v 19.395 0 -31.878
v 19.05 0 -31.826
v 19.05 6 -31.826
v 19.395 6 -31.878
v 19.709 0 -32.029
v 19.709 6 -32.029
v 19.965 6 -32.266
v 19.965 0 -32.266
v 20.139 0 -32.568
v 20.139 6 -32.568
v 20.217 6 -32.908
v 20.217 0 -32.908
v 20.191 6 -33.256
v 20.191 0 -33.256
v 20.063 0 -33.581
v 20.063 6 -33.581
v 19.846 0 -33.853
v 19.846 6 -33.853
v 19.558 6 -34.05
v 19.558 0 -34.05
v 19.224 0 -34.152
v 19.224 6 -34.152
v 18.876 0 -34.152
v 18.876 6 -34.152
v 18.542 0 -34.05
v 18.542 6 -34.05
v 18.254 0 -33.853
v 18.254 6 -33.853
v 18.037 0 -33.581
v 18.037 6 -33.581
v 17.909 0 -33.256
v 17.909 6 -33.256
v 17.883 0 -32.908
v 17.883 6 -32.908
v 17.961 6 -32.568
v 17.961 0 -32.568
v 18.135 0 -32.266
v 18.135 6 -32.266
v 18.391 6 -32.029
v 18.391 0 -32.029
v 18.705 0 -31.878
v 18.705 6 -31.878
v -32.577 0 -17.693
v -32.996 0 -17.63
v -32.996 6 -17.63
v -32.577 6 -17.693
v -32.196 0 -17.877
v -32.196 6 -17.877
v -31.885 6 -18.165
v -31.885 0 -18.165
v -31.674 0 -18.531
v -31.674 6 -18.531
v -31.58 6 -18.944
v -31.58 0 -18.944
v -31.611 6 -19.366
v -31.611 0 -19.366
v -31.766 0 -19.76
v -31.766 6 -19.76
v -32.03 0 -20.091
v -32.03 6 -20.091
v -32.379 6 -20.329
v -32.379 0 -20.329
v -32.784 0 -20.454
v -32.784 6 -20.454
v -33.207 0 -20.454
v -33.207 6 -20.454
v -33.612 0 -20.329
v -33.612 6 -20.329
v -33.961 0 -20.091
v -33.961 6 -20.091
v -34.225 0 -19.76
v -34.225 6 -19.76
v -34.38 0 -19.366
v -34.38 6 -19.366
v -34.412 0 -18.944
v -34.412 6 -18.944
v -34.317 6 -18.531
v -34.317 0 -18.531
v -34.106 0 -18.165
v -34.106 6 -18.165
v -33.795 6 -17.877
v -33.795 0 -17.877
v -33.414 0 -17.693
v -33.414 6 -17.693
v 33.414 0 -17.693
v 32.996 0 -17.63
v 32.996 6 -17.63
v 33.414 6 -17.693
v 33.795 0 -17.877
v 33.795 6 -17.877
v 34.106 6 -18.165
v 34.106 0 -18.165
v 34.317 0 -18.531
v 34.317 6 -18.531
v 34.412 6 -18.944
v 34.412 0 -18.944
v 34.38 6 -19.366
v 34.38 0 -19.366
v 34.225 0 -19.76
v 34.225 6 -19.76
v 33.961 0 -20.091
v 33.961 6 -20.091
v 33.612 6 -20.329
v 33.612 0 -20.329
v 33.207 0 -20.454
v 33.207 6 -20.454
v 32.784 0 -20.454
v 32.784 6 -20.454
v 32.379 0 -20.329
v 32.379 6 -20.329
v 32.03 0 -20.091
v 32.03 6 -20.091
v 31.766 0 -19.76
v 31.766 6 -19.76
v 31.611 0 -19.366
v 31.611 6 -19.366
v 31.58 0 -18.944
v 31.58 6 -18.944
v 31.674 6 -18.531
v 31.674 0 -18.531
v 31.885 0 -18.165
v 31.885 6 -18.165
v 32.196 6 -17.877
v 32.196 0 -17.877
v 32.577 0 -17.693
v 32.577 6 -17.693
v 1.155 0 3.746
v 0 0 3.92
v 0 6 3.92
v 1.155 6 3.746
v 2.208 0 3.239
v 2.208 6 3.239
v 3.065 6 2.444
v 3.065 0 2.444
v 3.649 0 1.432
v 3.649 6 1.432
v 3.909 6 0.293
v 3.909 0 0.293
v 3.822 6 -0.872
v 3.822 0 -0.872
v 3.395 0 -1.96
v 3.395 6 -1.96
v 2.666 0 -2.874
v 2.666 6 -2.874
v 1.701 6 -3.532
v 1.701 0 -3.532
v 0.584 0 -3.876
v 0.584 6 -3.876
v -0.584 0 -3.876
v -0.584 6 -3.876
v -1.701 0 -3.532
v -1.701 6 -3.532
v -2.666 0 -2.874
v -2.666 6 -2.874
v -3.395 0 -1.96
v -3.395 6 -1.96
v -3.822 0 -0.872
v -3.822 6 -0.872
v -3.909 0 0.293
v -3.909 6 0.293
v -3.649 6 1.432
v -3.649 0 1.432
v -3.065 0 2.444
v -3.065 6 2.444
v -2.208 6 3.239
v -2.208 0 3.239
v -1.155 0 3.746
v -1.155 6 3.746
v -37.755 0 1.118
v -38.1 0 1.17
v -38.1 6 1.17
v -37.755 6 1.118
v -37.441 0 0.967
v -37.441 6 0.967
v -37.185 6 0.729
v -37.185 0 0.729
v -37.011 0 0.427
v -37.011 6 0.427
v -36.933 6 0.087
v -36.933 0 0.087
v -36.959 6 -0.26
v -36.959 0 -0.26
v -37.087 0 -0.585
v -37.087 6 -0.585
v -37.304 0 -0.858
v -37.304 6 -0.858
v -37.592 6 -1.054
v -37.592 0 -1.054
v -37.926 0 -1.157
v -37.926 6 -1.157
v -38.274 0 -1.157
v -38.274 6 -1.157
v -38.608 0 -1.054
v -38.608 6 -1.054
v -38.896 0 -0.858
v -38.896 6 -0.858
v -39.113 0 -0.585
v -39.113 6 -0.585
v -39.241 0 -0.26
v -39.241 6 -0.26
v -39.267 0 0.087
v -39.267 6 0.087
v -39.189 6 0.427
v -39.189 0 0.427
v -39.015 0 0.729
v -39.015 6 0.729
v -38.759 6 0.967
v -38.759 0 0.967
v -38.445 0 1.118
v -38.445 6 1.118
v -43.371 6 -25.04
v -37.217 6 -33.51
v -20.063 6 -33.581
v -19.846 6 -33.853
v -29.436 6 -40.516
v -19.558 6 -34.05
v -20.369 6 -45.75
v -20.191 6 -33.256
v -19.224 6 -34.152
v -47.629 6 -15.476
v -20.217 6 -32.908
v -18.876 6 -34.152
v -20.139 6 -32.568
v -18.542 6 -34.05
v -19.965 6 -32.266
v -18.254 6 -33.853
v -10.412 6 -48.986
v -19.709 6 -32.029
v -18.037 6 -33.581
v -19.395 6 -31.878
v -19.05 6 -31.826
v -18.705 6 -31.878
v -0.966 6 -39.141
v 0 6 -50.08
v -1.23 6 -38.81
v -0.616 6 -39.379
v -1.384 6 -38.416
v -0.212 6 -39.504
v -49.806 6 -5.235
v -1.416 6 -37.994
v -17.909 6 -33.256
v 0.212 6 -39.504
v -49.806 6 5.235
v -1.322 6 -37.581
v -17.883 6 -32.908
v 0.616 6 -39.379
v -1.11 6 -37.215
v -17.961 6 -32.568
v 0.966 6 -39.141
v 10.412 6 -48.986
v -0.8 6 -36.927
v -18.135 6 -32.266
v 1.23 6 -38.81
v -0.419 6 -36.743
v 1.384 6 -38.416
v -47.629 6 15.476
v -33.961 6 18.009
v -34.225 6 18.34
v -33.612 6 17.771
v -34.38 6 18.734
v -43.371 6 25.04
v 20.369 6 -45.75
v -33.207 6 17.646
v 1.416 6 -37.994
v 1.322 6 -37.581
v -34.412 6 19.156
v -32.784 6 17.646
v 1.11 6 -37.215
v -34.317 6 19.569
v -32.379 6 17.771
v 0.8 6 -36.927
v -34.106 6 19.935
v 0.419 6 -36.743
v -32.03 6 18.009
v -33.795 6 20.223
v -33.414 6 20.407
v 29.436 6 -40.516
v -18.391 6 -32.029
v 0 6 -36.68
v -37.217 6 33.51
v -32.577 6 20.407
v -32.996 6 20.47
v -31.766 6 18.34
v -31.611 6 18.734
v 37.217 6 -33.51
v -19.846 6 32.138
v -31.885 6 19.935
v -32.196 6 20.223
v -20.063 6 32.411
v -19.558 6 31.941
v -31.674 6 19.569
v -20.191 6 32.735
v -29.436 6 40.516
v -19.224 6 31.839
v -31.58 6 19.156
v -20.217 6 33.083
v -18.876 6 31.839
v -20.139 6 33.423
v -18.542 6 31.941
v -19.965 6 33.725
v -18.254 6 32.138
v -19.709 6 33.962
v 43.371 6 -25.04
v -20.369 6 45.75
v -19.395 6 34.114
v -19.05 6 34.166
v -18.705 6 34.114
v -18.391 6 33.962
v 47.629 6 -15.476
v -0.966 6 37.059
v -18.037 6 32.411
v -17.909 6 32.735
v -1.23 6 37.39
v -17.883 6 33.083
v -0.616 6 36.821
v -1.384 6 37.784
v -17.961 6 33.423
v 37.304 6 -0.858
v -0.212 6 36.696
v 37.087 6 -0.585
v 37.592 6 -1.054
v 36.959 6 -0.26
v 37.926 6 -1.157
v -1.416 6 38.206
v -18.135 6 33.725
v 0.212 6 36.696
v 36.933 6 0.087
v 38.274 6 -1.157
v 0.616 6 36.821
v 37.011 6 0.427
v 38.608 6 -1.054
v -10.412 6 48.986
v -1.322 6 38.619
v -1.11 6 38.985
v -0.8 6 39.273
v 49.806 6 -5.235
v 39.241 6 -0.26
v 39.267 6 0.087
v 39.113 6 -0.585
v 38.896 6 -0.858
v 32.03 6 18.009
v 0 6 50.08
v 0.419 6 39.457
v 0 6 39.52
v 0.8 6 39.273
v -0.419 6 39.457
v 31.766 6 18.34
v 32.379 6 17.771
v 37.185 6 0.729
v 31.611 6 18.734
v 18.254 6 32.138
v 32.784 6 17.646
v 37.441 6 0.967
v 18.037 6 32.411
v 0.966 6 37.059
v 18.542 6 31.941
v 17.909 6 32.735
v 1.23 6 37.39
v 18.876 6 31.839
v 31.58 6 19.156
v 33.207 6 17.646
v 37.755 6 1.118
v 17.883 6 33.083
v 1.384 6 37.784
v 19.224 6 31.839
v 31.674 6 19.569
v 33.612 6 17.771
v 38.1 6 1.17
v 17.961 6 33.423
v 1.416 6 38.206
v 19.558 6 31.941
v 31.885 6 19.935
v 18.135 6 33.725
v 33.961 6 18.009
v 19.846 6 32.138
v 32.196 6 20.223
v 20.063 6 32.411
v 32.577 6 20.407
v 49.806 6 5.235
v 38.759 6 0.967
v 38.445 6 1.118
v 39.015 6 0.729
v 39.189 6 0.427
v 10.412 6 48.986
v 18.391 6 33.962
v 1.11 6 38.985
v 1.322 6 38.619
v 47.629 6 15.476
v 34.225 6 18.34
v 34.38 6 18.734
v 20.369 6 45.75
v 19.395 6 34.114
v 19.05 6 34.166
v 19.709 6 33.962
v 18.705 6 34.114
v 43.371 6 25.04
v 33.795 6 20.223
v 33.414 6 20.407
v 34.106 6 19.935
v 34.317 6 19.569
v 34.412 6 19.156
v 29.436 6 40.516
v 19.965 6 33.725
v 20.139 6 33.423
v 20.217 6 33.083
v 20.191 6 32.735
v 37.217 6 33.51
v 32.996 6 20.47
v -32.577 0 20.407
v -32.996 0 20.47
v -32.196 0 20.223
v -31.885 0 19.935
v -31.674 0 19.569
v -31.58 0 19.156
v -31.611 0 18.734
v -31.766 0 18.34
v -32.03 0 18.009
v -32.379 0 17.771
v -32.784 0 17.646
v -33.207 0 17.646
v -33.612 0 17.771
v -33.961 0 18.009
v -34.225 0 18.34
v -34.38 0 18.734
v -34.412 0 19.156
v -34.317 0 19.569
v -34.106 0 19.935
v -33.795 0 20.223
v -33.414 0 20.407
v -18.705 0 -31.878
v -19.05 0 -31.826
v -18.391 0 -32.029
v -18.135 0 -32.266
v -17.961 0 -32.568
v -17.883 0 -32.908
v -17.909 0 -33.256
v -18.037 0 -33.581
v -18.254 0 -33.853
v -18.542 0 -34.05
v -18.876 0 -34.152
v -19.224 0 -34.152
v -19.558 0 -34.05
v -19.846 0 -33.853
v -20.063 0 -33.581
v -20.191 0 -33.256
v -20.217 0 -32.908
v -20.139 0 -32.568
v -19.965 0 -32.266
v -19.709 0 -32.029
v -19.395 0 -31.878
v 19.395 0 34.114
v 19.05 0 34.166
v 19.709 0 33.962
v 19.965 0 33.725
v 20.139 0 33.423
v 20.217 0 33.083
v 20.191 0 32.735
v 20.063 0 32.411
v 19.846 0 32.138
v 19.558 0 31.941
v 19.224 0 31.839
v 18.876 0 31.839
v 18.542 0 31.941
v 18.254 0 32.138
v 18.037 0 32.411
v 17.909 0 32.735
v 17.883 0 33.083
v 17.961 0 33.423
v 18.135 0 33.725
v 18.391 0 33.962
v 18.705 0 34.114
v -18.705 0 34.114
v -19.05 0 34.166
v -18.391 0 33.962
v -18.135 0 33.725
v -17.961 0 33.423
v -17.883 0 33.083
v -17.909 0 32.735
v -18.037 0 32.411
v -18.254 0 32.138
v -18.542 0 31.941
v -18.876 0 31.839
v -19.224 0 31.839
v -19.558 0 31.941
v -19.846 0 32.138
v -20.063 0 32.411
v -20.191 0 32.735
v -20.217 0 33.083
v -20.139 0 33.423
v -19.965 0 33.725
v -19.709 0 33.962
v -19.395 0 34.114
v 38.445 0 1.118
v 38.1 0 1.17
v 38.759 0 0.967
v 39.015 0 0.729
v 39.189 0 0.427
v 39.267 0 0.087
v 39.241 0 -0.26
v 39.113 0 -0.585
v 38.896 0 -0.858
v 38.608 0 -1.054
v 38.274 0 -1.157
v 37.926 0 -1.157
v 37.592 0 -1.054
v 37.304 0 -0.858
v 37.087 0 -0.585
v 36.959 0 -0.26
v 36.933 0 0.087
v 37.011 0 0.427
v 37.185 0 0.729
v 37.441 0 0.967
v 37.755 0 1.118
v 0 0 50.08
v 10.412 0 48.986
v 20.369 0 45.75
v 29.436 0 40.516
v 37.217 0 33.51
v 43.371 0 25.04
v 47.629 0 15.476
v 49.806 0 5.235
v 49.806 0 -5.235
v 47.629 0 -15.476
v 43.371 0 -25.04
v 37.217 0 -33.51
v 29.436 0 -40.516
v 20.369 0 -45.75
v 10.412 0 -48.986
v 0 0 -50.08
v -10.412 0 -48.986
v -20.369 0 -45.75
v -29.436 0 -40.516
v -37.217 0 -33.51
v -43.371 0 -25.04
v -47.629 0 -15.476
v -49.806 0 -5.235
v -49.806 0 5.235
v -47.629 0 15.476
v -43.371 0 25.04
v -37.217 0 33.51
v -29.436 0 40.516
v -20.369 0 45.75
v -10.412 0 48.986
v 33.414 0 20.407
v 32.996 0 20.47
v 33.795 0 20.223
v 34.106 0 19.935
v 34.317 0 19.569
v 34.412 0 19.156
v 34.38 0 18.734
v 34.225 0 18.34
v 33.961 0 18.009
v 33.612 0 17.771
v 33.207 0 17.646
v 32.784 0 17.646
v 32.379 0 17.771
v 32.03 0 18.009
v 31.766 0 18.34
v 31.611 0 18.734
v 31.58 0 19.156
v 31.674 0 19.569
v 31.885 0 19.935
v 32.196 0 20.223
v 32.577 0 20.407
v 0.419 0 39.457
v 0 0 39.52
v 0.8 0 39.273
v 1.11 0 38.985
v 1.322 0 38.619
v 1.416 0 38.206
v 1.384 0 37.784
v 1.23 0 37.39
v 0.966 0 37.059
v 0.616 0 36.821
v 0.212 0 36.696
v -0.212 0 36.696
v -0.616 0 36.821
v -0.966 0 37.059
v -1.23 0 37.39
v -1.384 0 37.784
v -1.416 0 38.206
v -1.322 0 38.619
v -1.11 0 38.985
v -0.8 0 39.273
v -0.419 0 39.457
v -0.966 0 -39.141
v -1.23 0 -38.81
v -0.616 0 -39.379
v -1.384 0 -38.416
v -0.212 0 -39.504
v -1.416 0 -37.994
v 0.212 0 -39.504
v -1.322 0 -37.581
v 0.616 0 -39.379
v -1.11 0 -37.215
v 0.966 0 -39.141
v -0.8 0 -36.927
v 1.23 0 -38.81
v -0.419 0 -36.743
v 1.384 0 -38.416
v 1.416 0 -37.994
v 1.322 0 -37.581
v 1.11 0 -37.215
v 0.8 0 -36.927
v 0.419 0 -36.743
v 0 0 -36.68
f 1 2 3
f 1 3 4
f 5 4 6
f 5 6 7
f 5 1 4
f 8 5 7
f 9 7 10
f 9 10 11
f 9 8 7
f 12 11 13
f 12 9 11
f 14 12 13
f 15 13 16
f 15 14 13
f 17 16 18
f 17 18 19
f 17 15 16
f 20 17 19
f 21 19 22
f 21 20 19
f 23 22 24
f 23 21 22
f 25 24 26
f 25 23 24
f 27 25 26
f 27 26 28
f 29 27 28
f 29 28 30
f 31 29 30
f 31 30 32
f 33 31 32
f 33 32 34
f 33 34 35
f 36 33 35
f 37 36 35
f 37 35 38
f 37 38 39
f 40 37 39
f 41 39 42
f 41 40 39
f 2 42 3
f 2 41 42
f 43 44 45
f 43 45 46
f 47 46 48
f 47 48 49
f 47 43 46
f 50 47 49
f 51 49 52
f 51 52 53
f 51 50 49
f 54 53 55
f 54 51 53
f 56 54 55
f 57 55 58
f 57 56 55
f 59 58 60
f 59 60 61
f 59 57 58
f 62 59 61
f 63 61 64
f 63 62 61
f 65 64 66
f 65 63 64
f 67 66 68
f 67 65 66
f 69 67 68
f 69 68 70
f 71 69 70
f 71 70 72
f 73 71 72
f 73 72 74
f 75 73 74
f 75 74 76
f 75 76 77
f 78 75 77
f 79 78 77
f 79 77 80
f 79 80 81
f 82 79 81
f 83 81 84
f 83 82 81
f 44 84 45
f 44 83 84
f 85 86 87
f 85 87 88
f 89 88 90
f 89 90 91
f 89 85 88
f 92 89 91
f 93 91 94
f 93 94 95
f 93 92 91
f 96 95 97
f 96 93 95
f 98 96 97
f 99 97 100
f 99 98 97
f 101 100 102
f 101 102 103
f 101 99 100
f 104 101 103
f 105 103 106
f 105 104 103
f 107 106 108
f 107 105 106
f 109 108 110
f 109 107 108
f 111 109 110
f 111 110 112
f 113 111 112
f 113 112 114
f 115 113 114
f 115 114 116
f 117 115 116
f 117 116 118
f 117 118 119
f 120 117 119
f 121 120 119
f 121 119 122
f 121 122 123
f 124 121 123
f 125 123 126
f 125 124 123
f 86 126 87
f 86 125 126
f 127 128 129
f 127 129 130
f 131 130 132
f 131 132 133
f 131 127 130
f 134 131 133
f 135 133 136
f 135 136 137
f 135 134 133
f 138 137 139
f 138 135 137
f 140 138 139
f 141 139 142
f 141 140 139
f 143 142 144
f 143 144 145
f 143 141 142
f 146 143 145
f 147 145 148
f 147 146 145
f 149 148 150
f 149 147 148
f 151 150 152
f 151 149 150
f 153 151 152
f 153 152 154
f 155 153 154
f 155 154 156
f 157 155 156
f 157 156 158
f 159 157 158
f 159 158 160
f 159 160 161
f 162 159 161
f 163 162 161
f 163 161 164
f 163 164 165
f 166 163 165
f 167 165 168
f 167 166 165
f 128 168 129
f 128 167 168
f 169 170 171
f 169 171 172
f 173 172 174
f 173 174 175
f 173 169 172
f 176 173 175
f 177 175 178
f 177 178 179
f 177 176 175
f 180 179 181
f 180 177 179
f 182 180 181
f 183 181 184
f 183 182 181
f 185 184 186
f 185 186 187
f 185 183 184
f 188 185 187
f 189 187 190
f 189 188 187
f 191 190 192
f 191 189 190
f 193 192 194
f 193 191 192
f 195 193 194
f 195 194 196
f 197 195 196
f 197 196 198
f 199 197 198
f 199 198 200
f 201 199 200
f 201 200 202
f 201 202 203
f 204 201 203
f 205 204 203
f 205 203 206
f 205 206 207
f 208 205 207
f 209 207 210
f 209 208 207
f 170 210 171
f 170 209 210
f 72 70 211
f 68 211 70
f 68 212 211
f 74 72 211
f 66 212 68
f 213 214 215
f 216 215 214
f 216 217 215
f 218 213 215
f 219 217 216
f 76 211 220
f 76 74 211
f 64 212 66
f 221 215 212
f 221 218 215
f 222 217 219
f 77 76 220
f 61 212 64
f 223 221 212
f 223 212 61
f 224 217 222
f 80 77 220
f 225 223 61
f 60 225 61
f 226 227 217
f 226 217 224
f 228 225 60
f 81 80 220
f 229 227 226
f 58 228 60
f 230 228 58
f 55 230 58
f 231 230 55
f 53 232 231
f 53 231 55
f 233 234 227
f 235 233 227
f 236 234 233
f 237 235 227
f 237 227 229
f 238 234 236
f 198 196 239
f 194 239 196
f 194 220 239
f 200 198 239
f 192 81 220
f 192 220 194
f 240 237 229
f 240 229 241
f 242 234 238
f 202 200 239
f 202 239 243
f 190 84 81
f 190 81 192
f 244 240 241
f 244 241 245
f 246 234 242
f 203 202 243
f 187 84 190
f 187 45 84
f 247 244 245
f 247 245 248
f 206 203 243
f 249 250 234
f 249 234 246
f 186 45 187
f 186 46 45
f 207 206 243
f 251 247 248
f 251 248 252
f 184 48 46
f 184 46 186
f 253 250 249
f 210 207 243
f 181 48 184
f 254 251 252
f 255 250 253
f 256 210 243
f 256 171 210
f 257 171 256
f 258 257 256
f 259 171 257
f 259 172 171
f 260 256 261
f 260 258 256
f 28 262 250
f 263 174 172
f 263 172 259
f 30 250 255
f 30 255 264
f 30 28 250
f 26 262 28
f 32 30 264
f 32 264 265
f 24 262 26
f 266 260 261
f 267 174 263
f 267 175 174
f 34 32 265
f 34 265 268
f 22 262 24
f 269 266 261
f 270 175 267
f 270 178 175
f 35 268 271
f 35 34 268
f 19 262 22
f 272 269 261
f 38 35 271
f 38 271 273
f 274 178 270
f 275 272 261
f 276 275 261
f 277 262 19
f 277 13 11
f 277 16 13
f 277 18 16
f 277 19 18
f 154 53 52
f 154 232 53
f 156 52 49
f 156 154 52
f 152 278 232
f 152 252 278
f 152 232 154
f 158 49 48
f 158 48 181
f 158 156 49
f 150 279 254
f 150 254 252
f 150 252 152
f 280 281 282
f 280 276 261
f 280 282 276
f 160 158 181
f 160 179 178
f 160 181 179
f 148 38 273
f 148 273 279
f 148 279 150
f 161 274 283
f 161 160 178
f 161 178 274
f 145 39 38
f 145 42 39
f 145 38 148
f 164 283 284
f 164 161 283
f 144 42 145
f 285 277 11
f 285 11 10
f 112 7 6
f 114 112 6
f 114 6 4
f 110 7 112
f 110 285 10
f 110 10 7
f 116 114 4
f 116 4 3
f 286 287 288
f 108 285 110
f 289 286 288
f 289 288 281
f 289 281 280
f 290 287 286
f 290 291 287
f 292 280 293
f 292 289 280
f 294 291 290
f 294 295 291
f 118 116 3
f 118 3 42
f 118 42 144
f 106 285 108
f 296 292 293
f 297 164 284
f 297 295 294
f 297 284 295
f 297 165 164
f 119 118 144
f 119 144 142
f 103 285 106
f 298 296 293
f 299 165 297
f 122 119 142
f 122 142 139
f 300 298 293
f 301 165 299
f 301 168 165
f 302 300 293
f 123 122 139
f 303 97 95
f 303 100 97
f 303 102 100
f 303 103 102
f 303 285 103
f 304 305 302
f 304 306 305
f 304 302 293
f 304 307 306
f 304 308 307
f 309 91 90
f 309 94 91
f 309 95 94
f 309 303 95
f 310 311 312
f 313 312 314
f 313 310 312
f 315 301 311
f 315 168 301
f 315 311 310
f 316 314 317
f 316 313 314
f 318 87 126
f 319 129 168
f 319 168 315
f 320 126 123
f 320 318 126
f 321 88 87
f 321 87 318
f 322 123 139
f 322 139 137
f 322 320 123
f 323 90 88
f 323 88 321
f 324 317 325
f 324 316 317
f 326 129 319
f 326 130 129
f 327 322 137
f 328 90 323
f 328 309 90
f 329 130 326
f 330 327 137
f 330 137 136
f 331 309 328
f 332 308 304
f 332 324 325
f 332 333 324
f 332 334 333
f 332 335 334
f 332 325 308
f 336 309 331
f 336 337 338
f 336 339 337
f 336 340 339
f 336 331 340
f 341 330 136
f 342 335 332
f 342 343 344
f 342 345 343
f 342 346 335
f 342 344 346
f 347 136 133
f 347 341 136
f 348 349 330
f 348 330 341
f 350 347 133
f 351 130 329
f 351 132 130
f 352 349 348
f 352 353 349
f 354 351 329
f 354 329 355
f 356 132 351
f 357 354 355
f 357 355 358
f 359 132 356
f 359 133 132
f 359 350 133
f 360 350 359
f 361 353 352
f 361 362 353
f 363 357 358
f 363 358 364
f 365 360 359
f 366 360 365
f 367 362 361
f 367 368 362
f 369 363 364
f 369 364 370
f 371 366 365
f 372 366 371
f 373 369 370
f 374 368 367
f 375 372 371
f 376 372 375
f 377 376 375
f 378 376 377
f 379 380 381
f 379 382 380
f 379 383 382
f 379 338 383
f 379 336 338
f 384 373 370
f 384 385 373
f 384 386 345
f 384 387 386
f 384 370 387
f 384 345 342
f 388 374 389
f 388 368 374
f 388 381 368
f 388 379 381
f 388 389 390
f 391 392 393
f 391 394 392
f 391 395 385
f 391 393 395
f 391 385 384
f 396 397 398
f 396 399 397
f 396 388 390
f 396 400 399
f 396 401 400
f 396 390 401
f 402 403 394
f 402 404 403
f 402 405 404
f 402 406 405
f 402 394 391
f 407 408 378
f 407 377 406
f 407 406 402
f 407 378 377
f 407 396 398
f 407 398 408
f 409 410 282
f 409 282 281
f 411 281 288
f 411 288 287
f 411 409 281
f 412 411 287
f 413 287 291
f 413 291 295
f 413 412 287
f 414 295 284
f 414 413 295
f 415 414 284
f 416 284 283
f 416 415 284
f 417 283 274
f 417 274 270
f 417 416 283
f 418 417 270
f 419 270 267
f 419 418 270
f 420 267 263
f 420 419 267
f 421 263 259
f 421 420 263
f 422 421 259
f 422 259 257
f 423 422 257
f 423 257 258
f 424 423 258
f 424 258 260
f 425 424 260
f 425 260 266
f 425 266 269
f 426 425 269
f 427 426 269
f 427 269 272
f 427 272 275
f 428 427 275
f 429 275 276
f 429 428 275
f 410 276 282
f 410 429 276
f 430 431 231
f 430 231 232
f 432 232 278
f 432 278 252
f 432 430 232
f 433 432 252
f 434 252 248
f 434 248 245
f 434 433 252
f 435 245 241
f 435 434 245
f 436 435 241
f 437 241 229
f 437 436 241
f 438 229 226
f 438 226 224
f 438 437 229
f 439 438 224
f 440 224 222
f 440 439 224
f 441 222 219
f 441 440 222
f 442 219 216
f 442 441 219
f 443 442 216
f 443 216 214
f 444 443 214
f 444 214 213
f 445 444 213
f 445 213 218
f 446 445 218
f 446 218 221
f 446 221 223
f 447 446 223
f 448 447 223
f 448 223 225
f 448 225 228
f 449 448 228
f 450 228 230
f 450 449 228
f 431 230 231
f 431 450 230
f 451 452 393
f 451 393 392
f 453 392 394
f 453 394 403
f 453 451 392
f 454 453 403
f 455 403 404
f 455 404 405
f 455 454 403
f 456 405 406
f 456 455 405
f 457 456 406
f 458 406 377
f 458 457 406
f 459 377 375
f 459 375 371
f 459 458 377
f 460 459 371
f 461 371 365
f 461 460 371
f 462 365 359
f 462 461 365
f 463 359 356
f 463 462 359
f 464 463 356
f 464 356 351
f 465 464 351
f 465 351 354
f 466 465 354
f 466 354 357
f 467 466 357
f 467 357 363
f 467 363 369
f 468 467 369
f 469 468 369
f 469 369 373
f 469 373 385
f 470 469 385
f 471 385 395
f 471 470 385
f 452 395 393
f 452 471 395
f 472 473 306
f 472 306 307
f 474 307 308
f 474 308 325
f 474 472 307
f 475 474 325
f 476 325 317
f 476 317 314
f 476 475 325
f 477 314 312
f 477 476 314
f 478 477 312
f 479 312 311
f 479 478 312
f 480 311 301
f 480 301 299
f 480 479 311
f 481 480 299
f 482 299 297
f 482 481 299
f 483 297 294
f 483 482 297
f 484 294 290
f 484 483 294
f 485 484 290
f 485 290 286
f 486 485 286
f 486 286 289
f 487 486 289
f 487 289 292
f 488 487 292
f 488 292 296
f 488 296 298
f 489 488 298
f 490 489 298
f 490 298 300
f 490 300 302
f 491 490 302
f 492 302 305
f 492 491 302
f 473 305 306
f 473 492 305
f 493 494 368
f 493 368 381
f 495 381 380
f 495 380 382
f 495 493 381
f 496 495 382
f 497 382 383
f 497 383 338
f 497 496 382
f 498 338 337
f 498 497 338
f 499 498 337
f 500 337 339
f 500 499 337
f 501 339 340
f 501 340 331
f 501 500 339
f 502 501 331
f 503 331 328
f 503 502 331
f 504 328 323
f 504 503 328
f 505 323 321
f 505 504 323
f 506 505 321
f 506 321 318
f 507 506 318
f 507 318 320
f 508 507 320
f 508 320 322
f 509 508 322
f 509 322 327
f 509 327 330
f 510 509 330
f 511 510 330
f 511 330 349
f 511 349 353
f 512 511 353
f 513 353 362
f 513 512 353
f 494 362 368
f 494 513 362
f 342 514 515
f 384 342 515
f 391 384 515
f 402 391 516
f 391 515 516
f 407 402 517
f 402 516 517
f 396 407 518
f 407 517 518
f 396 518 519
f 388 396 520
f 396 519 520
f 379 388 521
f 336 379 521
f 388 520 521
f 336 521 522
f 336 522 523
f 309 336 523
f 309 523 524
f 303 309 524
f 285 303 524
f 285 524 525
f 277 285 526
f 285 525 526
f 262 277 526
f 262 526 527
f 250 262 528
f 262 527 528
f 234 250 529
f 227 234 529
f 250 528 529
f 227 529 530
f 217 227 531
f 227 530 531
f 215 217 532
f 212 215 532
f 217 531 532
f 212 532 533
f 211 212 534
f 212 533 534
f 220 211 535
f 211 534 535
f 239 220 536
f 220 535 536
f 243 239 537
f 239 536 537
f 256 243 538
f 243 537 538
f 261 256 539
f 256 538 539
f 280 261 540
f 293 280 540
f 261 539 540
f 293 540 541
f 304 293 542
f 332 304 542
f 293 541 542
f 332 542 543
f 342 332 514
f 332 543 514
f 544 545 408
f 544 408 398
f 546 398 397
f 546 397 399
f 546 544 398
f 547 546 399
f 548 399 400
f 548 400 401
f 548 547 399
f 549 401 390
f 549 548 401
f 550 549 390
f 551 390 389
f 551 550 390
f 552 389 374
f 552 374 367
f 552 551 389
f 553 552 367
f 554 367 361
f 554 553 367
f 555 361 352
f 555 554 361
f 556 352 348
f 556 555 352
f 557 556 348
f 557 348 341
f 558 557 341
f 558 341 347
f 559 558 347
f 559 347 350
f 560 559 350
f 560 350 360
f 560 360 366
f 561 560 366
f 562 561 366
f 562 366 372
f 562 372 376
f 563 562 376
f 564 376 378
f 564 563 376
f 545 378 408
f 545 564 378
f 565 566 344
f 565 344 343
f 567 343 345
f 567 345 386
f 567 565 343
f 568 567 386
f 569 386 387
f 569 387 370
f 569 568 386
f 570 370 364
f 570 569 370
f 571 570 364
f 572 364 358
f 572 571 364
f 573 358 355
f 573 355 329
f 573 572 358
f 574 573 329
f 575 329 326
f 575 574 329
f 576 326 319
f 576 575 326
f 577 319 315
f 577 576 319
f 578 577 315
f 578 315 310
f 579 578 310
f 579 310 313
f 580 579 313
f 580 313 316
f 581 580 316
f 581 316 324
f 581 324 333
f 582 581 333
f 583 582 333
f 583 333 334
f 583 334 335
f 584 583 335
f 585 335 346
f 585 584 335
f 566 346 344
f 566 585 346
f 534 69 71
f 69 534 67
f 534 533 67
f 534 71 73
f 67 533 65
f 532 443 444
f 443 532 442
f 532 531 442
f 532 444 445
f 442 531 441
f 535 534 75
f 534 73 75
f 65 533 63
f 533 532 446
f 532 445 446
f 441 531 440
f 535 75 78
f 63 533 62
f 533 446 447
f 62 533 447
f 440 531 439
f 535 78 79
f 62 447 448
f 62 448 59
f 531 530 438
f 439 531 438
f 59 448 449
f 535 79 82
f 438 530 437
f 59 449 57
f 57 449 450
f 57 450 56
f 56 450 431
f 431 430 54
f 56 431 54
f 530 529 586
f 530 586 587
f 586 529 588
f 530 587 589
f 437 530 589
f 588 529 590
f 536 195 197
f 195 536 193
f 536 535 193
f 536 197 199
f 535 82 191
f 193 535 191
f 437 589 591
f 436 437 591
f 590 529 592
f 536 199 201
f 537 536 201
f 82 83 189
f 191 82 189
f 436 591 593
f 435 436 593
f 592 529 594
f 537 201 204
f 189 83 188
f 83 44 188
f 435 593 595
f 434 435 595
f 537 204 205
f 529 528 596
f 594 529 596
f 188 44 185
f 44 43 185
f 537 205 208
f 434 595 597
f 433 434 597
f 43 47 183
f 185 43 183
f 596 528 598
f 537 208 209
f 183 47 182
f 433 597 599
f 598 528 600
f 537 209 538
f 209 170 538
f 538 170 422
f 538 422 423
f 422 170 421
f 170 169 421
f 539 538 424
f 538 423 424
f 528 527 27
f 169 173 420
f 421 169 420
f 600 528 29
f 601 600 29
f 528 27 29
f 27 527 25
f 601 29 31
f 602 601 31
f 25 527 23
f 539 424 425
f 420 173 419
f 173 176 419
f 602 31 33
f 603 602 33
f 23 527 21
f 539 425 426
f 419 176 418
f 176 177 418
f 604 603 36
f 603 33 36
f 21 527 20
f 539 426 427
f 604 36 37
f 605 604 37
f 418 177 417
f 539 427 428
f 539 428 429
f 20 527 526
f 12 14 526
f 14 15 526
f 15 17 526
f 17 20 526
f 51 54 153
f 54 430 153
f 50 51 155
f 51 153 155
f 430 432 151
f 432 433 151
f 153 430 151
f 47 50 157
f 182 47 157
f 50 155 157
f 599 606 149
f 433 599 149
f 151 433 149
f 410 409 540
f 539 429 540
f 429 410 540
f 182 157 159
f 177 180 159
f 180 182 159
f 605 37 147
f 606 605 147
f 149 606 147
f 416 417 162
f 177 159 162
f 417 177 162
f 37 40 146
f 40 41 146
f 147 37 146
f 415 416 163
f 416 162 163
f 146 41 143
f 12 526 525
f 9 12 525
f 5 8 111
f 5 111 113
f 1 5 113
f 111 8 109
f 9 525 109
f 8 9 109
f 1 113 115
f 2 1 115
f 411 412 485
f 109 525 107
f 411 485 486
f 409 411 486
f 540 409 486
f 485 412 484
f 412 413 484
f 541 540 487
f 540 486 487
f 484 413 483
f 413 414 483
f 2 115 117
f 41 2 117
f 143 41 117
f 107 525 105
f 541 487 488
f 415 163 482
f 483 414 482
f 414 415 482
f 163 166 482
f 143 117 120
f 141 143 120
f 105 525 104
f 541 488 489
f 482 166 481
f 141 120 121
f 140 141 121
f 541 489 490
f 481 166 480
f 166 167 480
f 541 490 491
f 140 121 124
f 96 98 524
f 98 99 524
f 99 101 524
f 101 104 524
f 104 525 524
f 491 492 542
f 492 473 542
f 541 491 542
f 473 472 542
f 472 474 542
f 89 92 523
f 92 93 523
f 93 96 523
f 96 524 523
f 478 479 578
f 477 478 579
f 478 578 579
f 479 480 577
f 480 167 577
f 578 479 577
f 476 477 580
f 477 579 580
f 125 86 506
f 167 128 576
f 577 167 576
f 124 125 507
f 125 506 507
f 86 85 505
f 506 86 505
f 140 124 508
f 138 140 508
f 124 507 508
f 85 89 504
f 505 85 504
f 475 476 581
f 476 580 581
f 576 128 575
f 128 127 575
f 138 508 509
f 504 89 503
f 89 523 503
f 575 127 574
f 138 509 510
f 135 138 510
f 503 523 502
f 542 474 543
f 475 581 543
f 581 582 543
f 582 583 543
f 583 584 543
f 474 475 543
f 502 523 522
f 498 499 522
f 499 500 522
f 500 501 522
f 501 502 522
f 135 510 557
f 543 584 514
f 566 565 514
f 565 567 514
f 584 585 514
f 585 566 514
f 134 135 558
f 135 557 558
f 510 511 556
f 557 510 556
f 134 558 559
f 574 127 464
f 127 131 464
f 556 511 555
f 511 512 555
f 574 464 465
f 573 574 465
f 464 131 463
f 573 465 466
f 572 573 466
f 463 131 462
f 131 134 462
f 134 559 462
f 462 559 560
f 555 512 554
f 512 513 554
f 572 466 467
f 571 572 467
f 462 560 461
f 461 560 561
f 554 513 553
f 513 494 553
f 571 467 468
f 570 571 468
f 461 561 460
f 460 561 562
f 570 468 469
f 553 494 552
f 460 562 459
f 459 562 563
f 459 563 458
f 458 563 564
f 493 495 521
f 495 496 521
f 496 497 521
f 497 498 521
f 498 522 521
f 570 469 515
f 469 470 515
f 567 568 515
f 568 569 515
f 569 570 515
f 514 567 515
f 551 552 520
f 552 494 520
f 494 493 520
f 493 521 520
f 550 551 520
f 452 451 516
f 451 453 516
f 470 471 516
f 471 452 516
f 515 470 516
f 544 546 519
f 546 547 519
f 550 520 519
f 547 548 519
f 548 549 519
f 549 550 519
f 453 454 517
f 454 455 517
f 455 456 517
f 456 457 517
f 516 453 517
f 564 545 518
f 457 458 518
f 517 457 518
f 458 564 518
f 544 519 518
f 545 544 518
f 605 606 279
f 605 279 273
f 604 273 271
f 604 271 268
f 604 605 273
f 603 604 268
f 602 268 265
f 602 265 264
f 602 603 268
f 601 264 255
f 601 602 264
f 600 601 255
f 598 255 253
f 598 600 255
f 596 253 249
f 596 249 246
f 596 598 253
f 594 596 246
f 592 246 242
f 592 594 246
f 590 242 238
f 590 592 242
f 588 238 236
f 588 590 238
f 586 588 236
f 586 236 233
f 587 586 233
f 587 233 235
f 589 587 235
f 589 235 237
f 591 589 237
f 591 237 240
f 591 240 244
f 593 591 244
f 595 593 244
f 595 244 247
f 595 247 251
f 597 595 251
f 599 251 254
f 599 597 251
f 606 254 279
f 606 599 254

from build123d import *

# Parameters (mm, degrees)
SKETCH1_R           = 50
SKETCH1_R_2         = 1.25
SKETCH1_R_3         = 1.5
SKETCH1_R_4         = 4
BOSS_EXTRUDE1_DEPTH = 6
MOVE_FACE1_BY       = 0.08
MOVE_FACE1_2_BY     = 0.08
MOVE_FACE1_3_BY     = 0.08
MOVE_FACE1_4_BY     = 0.08
MOVE_FACE1_5_BY     = 0.08
MOVE_FACE1_6_BY     = 0.08
MOVE_FACE1_7_BY     = 0.08
MOVE_FACE1_8_BY     = 0.08
MOVE_FACE1_9_BY     = 0.08
MOVE_FACE1_10_BY    = 0.08
MOVE_FACE1_11_BY    = 0.08
MOVE_FACE1_12_BY    = 0.08
MOVE_FACE1_13_BY    = 0.08
MOVE_FACE1_14_BY    = 0.08


with BuildPart() as part:
    # Sketch1 → Boss-Extrude1 (new body)
    with BuildSketch(Plane(origin=(0, 0, 0), x_dir=(1, 0, 0), z_dir=(0, 1, 0))):
        with Locations(Location((0, 0, 0), (0, 0, 270))):
            Circle(SKETCH1_R)
        with Locations(Location((38.1, 0, 0), (0, 0, 270))):
            Circle(SKETCH1_R_2, mode=Mode.SUBTRACT)
        with Locations(Location((19.05, -32.995567884, 0), (0, 0, 270))):
            Circle(SKETCH1_R_2, mode=Mode.SUBTRACT)
        with Locations(Location((-19.05, -32.995567884, 0), (0, 0, 270))):
            Circle(SKETCH1_R_2, mode=Mode.SUBTRACT)
        with Locations(Location((-38.1, 0, 0), (0, 0, 270))):
            Circle(SKETCH1_R_2, mode=Mode.SUBTRACT)
        with Locations(Location((-19.05, 32.995567884, 0), (0, 0, 270))):
            Circle(SKETCH1_R_2, mode=Mode.SUBTRACT)
        with Locations(Location((19.05, 32.995567884, 0), (0, 0, 270))):
            Circle(SKETCH1_R_2, mode=Mode.SUBTRACT)
        with Locations(Location((0, 38.1, 0), (0, 0, 270))):
            Circle(SKETCH1_R_3, mode=Mode.SUBTRACT)
        with Locations(Location((32.995567884, 19.05, 0), (0, 0, 270))):
            Circle(SKETCH1_R_3, mode=Mode.SUBTRACT)
        with Locations(Location((32.995567884, -19.05, 0), (0, 0, 270))):
            Circle(SKETCH1_R_3, mode=Mode.SUBTRACT)
        with Locations(Location((0, -38.1, 0), (0, 0, 270))):
            Circle(SKETCH1_R_3, mode=Mode.SUBTRACT)
        with Locations(Location((-32.995567884, -19.05, 0), (0, 0, 270))):
            Circle(SKETCH1_R_3, mode=Mode.SUBTRACT)
        with Locations(Location((-32.995567884, 19.05, 0), (0, 0, 270))):
            Circle(SKETCH1_R_3, mode=Mode.SUBTRACT)
        with Locations(Location((0, 0, 0), (0, 0, 270))):
            Circle(SKETCH1_R_4, mode=Mode.SUBTRACT)
    extrude(amount=BOSS_EXTRUDE1_DEPTH)

    # Move Face1: a curved face moved outward by 0.08
    add(Solid.thicken(part.faces().sort_by_distance((0, 3, -4))[0], MOVE_FACE1_BY))

    # Move Face1 2: a curved face moved outward by 0.08
    add(Solid.thicken(part.faces().sort_by_distance((0, 3, -50))[0], MOVE_FACE1_2_BY))

    # Move Face1 3: a curved face moved outward by 0.08
    add(Solid.thicken(part.faces().sort_by_distance((38.1, 3, -1.25))[0], MOVE_FACE1_3_BY))

    # Move Face1 4: a curved face moved outward by 0.08
    add(Solid.thicken(part.faces().sort_by_distance((0, 3, -39.6))[0], MOVE_FACE1_4_BY))

    # Move Face1 5: a curved face moved outward by 0.08
    add(Solid.thicken(part.faces().sort_by_distance((19.05, 3, 31.745567884))[0], MOVE_FACE1_5_BY))

    # Move Face1 6: a curved face moved outward by 0.08
    add(Solid.thicken(part.faces().sort_by_distance((-19.05, 3, 31.745567884))[0], MOVE_FACE1_6_BY))

    # Move Face1 7: a curved face moved outward by 0.08
    add(Solid.thicken(part.faces().sort_by_distance((-38.1, 3, -1.25))[0], MOVE_FACE1_7_BY))

    # Move Face1 8: a curved face moved outward by 0.08
    add(Solid.thicken(part.faces().sort_by_distance((-19.05, 3, -34.245567884))[0], MOVE_FACE1_8_BY))

    # Move Face1 9: a curved face moved outward by 0.08
    add(Solid.thicken(part.faces().sort_by_distance((19.05, 3, -34.245567884))[0], MOVE_FACE1_9_BY))

    # Move Face1 10: a curved face moved outward by 0.08
    add(Solid.thicken(part.faces().sort_by_distance((32.995567884, 3, -20.55))[0], MOVE_FACE1_10_BY))

    # Move Face1 11: a curved face moved outward by 0.08
    add(Solid.thicken(part.faces().sort_by_distance((32.995567884, 3, 17.55))[0], MOVE_FACE1_11_BY))

    # Move Face1 12: a curved face moved outward by 0.08
    add(Solid.thicken(part.faces().sort_by_distance((0, 3, 36.6))[0], MOVE_FACE1_12_BY))

    # Move Face1 13: a curved face moved outward by 0.08
    add(Solid.thicken(part.faces().sort_by_distance((-32.995567884, 3, 17.55))[0], MOVE_FACE1_13_BY))

    # Move Face1 14: a curved face moved outward by 0.08
    add(Solid.thicken(part.faces().sort_by_distance((-32.995567884, 3, -20.55))[0], MOVE_FACE1_14_BY))


solid = part.part
